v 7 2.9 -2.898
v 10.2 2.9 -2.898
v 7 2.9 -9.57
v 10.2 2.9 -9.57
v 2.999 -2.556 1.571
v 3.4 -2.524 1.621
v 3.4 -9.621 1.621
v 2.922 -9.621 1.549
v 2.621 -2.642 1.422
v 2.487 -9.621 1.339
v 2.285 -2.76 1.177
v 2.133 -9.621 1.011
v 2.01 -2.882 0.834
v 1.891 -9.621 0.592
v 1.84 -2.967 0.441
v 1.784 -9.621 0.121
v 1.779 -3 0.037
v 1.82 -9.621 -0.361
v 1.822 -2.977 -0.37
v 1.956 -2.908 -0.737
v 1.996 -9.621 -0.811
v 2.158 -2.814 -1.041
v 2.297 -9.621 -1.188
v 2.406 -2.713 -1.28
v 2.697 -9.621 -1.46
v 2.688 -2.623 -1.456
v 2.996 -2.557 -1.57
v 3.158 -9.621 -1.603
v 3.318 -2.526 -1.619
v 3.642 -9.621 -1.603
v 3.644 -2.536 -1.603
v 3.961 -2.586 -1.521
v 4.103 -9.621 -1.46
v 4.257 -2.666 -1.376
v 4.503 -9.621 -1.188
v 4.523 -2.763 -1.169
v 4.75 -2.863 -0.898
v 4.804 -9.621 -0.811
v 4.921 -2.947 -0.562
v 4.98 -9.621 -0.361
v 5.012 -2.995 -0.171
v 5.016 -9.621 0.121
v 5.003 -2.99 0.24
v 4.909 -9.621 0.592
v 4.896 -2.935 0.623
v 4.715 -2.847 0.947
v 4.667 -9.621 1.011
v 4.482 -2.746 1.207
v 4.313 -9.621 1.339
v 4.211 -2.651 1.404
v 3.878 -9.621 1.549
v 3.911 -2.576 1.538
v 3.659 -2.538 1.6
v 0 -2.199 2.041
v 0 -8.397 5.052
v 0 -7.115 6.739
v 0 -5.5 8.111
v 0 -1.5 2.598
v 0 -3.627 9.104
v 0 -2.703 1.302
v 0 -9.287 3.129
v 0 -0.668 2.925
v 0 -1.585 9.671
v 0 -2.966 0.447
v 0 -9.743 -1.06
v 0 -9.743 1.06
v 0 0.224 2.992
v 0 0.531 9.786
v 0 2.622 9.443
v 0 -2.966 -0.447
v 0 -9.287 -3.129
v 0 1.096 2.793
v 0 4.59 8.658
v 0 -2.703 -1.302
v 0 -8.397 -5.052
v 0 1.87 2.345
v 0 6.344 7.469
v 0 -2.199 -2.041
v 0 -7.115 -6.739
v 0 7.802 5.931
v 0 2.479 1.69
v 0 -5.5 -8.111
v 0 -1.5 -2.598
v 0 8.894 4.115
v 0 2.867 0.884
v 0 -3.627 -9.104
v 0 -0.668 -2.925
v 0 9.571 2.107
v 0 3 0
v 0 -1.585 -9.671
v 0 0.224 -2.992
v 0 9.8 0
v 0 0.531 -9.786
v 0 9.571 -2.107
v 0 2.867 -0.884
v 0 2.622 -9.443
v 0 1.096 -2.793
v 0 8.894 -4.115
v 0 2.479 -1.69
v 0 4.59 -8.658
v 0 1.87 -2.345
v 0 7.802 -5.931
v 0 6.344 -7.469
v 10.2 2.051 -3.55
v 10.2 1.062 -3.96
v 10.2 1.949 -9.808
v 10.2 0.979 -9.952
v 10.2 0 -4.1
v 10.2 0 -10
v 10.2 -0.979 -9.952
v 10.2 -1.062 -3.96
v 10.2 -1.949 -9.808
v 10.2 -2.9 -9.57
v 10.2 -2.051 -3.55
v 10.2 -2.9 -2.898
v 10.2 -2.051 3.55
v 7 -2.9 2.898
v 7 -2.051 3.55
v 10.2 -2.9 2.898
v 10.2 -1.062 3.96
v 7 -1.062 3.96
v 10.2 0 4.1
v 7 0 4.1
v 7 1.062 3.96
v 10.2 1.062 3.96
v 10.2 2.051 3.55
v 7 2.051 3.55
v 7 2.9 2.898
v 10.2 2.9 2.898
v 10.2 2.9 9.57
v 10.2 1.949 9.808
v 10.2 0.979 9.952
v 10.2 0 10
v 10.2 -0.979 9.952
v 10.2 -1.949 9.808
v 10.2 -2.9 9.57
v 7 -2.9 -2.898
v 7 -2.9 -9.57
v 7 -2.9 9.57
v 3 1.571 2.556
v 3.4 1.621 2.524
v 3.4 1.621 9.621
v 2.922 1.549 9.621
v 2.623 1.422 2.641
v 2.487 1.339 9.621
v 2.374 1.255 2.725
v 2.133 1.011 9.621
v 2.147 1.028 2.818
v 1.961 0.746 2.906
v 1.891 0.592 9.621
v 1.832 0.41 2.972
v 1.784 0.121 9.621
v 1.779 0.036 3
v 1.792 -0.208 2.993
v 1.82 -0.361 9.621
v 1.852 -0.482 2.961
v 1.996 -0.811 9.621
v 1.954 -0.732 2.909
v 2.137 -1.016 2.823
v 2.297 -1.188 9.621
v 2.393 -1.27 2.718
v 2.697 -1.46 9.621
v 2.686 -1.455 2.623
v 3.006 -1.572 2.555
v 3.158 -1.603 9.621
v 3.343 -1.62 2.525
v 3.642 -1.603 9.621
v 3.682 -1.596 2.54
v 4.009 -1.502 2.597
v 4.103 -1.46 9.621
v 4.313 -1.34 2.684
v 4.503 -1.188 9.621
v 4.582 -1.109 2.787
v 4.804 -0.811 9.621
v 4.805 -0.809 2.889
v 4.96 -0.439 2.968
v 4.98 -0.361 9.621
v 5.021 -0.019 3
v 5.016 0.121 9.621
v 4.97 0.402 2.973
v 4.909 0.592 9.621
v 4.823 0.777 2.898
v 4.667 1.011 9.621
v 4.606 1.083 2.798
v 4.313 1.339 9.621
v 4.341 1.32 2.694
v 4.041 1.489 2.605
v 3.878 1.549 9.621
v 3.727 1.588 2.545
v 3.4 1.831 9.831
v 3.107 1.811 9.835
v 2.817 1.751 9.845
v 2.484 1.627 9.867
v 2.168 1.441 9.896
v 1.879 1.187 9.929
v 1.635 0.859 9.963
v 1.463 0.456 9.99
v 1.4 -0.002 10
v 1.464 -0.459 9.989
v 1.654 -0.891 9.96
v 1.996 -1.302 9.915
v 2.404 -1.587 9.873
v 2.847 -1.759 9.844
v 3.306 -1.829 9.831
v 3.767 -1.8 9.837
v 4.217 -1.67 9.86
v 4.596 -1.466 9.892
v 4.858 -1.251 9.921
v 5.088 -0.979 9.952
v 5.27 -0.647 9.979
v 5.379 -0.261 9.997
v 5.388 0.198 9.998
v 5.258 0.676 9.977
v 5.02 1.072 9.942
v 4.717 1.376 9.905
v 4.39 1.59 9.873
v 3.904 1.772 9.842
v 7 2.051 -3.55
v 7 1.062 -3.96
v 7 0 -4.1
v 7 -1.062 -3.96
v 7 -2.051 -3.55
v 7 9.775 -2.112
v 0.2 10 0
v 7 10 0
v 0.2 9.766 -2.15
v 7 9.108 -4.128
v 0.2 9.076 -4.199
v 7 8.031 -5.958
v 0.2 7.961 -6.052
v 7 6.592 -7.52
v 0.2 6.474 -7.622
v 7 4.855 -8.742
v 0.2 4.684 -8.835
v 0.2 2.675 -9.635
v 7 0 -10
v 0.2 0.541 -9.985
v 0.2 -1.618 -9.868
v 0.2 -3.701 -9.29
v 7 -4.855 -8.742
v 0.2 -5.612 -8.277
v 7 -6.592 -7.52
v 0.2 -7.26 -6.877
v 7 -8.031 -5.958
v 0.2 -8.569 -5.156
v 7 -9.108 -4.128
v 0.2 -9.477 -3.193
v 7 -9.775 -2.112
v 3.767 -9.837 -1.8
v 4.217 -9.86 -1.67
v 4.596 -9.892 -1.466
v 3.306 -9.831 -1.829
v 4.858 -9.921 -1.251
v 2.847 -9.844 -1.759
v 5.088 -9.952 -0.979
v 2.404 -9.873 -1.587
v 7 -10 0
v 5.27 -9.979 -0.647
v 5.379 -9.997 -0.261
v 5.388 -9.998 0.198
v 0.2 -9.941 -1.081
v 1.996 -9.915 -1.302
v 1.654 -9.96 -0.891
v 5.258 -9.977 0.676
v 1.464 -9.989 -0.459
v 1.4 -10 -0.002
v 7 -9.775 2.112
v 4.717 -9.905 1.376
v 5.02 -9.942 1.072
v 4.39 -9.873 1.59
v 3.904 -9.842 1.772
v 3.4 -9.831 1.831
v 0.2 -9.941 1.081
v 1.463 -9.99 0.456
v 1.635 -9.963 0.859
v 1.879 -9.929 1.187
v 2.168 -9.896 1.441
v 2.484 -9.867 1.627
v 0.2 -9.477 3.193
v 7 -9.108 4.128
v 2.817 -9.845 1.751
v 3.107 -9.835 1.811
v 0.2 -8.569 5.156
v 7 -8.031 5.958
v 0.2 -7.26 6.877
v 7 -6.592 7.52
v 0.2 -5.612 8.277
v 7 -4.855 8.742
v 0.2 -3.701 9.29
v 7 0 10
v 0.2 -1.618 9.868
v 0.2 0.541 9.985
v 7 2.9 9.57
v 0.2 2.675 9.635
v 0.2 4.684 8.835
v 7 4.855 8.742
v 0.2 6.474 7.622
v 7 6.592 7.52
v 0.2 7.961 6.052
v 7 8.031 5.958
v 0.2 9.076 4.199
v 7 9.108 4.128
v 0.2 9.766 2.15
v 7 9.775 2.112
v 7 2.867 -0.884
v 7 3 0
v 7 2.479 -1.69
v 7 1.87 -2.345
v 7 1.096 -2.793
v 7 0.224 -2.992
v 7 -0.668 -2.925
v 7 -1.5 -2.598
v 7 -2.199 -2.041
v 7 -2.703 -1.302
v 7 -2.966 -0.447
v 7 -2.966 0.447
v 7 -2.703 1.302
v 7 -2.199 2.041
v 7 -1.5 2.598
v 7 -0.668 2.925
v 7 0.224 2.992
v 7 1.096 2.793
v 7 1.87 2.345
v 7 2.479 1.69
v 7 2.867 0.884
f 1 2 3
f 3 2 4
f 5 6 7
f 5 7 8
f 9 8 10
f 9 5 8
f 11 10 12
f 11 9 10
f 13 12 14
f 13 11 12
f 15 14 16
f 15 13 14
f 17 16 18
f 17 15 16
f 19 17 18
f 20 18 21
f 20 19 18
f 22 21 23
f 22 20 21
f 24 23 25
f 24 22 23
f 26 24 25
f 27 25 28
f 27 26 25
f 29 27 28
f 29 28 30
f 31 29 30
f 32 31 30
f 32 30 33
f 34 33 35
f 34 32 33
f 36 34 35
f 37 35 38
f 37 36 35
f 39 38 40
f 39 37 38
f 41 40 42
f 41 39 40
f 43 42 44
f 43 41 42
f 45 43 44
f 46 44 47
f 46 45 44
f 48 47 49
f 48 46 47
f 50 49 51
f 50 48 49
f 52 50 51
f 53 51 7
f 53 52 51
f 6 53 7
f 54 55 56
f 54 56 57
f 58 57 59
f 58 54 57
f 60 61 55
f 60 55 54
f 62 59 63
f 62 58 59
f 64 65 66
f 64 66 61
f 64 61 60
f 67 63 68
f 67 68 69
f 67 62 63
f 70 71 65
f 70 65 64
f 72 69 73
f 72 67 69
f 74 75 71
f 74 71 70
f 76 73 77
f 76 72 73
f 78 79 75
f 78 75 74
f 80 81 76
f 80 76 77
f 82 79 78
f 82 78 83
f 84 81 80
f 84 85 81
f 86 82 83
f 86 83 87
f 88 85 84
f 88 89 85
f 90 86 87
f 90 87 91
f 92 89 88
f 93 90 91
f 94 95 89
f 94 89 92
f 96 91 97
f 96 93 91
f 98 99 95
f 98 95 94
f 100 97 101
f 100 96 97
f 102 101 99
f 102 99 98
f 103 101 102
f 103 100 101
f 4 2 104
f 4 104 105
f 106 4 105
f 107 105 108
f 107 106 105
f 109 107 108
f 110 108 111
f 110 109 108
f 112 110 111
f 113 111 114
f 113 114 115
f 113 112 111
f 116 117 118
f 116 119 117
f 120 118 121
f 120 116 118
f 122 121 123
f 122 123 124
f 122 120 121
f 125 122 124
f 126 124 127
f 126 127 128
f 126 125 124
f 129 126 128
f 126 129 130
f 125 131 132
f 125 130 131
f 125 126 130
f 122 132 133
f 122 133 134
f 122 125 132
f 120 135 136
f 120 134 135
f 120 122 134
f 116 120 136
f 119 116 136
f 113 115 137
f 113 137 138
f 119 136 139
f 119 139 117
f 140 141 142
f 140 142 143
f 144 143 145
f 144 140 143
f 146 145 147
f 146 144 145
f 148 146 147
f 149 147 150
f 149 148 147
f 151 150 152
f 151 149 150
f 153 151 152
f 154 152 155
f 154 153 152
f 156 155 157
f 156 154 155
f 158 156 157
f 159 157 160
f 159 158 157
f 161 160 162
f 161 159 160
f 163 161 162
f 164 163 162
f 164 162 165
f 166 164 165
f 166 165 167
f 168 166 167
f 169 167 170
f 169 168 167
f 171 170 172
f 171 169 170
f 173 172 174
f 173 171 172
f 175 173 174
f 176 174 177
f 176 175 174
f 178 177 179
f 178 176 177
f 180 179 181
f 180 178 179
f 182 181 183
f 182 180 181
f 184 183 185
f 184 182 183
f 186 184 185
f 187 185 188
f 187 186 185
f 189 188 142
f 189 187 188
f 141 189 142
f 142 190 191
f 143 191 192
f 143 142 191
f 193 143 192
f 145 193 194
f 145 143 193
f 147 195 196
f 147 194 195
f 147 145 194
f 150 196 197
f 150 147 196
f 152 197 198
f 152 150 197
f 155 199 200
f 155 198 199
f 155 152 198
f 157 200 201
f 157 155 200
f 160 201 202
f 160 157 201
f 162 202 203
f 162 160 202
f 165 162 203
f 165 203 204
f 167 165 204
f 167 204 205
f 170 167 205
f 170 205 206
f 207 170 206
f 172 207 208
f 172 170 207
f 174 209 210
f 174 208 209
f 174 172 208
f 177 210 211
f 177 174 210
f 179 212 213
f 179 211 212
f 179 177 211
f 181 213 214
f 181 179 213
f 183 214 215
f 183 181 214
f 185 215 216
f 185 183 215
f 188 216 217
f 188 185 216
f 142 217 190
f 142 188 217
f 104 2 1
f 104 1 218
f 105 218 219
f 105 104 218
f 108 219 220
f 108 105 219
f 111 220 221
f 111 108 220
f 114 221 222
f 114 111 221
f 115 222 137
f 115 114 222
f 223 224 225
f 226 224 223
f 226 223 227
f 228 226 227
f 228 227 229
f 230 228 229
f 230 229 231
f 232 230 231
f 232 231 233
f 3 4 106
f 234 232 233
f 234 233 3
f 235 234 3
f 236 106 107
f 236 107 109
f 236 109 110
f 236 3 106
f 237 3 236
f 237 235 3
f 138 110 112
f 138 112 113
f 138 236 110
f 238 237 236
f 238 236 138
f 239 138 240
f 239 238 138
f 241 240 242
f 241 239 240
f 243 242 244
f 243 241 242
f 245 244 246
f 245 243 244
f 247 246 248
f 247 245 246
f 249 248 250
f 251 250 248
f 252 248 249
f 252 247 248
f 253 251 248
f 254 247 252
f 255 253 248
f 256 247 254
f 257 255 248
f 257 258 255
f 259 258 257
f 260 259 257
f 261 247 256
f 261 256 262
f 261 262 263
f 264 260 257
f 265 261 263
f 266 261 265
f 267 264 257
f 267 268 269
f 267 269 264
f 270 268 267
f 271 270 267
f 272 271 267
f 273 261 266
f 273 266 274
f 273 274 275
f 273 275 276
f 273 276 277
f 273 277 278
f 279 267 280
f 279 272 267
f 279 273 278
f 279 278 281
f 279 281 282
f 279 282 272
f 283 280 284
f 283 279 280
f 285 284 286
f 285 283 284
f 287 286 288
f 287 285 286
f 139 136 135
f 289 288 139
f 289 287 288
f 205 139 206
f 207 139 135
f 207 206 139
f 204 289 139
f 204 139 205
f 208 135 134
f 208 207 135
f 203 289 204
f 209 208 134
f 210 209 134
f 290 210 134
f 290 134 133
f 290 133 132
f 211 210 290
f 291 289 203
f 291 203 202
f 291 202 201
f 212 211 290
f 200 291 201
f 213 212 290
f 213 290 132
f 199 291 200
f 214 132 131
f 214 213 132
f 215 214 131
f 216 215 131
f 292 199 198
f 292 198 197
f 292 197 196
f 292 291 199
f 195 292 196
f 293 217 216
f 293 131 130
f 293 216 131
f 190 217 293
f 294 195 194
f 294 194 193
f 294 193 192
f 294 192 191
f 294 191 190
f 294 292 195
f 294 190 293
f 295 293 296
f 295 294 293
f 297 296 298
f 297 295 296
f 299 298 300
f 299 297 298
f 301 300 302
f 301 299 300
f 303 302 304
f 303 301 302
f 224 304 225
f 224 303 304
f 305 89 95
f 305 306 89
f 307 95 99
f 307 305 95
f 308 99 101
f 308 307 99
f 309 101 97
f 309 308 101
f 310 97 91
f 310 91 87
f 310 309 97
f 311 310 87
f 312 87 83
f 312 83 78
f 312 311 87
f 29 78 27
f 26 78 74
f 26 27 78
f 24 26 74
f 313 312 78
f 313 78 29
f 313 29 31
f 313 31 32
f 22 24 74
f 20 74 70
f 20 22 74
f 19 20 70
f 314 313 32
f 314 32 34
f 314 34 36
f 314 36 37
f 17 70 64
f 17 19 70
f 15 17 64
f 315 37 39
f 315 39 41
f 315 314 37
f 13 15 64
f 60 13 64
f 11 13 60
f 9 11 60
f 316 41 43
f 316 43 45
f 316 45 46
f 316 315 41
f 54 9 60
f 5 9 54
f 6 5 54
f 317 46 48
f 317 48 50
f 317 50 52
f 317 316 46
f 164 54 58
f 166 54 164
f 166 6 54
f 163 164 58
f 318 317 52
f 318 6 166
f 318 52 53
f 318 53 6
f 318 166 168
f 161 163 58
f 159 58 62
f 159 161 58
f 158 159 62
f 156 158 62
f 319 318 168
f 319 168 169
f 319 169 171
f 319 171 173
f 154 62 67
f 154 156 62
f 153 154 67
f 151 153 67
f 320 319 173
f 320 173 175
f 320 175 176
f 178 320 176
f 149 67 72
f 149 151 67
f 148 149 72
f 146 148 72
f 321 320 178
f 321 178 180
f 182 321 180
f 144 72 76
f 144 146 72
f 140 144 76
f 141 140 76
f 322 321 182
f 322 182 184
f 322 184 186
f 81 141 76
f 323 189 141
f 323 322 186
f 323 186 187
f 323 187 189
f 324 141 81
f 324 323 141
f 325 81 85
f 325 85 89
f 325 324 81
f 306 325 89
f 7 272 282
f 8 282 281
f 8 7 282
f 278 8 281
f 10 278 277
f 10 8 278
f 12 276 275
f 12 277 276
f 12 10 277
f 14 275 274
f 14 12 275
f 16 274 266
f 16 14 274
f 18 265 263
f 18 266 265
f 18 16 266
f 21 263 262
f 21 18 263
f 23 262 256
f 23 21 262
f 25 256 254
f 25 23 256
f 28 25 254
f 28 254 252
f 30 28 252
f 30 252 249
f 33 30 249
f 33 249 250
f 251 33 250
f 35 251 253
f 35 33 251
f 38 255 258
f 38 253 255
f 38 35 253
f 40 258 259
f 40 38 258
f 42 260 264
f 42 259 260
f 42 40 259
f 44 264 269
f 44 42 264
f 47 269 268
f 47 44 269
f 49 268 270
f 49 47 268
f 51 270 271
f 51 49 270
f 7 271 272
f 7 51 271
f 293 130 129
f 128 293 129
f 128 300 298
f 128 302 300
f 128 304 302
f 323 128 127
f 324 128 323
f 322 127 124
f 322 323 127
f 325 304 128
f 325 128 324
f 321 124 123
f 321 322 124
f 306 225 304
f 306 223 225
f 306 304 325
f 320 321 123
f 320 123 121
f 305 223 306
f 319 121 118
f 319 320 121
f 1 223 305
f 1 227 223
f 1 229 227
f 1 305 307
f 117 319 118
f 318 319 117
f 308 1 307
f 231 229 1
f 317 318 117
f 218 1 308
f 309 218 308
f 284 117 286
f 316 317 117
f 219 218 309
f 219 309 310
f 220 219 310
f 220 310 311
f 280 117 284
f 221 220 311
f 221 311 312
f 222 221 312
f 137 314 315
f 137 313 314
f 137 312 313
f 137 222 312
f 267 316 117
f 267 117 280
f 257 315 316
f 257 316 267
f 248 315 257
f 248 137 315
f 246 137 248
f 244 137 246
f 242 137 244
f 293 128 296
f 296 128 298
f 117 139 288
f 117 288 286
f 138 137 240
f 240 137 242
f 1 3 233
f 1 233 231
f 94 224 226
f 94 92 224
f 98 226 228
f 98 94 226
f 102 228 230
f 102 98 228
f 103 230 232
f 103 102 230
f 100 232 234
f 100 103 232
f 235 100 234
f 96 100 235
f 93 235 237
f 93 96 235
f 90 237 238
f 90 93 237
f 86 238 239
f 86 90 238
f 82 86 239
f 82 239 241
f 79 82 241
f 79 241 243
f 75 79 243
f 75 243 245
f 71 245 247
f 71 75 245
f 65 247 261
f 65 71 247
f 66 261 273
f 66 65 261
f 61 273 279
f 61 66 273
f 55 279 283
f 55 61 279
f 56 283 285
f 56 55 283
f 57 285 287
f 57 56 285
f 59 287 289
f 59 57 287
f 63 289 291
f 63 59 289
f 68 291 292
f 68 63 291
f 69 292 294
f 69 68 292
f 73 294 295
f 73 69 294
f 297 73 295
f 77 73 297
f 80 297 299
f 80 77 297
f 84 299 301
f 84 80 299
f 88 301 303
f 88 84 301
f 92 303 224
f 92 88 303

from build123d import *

# Parameters (mm, degrees)
SKETCH2_W          = 3.2
SKETCH2_H          = 4.1
SKETCH3_W          = 22
SKETCH3_H          = 21
SKETCH3_W_2        = 20
SKETCH3_H_2        = 5.8
CUT_EXTRUDE1_DEPTH = 3.2


with BuildPart() as part:
    # Sketch1 → Revolve1 (revolve)
    with BuildSketch(Plane.XY):
        Polygon((0, 9.8), (0, 3), (10.2, 3), (10.2, 10), (0.2, 10), align=None)
    revolve(axis=Axis((10.2, 0, 0), (-1, 0, 0)))

    # Sketch2 → Cut-Revolve1 (revolve, cut)
    with BuildSketch(Plane.XY):
        with Locations((8.6, 2.05)):
            Rectangle(SKETCH2_W, SKETCH2_H)
    revolve(axis=Axis((10.2, 0, 0), (-1, 0, 0)), mode=Mode.SUBTRACT)

    # Sketch3 → Cut-Extrude1 (cut)
    with BuildSketch(Plane(origin=(10.2, 0, 0), x_dir=(0, 0, -1), z_dir=(1, 0, 0))):
        Rectangle(SKETCH3_W, SKETCH3_H)
        Rectangle(SKETCH3_W_2, SKETCH3_H_2, mode=Mode.SUBTRACT)
    extrude(amount=-CUT_EXTRUDE1_DEPTH, mode=Mode.SUBTRACT)

    # Sketch4 → Cut-Revolve2 (revolve, cut)
    with BuildSketch(Plane(origin=(3.4, 0, 0), x_dir=(0, 0, -1), z_dir=(1, 0, 0))):
        Polygon((-10, 0), (-10, 2), (-9.621, 1.621), (0, 1.621), (0, 0), align=None)
    revolve(axis=Axis((3.4, 0, 0), (0, 0, 1)), mode=Mode.SUBTRACT)

    # Sketch5 → Cut-Revolve3 (revolve, cut)
    with BuildSketch(Plane(origin=(3.4, 0, 0), x_dir=(0, 0, -1), z_dir=(1, 0, 0))):
        Polygon((0, -10), (-2, -10), (-1.621, -9.621), (-1.621, 0), (0, 0), align=None)
    revolve(axis=Axis((3.4, 0, 0), (0, -1, 0)), mode=Mode.SUBTRACT)


solid = part.part
